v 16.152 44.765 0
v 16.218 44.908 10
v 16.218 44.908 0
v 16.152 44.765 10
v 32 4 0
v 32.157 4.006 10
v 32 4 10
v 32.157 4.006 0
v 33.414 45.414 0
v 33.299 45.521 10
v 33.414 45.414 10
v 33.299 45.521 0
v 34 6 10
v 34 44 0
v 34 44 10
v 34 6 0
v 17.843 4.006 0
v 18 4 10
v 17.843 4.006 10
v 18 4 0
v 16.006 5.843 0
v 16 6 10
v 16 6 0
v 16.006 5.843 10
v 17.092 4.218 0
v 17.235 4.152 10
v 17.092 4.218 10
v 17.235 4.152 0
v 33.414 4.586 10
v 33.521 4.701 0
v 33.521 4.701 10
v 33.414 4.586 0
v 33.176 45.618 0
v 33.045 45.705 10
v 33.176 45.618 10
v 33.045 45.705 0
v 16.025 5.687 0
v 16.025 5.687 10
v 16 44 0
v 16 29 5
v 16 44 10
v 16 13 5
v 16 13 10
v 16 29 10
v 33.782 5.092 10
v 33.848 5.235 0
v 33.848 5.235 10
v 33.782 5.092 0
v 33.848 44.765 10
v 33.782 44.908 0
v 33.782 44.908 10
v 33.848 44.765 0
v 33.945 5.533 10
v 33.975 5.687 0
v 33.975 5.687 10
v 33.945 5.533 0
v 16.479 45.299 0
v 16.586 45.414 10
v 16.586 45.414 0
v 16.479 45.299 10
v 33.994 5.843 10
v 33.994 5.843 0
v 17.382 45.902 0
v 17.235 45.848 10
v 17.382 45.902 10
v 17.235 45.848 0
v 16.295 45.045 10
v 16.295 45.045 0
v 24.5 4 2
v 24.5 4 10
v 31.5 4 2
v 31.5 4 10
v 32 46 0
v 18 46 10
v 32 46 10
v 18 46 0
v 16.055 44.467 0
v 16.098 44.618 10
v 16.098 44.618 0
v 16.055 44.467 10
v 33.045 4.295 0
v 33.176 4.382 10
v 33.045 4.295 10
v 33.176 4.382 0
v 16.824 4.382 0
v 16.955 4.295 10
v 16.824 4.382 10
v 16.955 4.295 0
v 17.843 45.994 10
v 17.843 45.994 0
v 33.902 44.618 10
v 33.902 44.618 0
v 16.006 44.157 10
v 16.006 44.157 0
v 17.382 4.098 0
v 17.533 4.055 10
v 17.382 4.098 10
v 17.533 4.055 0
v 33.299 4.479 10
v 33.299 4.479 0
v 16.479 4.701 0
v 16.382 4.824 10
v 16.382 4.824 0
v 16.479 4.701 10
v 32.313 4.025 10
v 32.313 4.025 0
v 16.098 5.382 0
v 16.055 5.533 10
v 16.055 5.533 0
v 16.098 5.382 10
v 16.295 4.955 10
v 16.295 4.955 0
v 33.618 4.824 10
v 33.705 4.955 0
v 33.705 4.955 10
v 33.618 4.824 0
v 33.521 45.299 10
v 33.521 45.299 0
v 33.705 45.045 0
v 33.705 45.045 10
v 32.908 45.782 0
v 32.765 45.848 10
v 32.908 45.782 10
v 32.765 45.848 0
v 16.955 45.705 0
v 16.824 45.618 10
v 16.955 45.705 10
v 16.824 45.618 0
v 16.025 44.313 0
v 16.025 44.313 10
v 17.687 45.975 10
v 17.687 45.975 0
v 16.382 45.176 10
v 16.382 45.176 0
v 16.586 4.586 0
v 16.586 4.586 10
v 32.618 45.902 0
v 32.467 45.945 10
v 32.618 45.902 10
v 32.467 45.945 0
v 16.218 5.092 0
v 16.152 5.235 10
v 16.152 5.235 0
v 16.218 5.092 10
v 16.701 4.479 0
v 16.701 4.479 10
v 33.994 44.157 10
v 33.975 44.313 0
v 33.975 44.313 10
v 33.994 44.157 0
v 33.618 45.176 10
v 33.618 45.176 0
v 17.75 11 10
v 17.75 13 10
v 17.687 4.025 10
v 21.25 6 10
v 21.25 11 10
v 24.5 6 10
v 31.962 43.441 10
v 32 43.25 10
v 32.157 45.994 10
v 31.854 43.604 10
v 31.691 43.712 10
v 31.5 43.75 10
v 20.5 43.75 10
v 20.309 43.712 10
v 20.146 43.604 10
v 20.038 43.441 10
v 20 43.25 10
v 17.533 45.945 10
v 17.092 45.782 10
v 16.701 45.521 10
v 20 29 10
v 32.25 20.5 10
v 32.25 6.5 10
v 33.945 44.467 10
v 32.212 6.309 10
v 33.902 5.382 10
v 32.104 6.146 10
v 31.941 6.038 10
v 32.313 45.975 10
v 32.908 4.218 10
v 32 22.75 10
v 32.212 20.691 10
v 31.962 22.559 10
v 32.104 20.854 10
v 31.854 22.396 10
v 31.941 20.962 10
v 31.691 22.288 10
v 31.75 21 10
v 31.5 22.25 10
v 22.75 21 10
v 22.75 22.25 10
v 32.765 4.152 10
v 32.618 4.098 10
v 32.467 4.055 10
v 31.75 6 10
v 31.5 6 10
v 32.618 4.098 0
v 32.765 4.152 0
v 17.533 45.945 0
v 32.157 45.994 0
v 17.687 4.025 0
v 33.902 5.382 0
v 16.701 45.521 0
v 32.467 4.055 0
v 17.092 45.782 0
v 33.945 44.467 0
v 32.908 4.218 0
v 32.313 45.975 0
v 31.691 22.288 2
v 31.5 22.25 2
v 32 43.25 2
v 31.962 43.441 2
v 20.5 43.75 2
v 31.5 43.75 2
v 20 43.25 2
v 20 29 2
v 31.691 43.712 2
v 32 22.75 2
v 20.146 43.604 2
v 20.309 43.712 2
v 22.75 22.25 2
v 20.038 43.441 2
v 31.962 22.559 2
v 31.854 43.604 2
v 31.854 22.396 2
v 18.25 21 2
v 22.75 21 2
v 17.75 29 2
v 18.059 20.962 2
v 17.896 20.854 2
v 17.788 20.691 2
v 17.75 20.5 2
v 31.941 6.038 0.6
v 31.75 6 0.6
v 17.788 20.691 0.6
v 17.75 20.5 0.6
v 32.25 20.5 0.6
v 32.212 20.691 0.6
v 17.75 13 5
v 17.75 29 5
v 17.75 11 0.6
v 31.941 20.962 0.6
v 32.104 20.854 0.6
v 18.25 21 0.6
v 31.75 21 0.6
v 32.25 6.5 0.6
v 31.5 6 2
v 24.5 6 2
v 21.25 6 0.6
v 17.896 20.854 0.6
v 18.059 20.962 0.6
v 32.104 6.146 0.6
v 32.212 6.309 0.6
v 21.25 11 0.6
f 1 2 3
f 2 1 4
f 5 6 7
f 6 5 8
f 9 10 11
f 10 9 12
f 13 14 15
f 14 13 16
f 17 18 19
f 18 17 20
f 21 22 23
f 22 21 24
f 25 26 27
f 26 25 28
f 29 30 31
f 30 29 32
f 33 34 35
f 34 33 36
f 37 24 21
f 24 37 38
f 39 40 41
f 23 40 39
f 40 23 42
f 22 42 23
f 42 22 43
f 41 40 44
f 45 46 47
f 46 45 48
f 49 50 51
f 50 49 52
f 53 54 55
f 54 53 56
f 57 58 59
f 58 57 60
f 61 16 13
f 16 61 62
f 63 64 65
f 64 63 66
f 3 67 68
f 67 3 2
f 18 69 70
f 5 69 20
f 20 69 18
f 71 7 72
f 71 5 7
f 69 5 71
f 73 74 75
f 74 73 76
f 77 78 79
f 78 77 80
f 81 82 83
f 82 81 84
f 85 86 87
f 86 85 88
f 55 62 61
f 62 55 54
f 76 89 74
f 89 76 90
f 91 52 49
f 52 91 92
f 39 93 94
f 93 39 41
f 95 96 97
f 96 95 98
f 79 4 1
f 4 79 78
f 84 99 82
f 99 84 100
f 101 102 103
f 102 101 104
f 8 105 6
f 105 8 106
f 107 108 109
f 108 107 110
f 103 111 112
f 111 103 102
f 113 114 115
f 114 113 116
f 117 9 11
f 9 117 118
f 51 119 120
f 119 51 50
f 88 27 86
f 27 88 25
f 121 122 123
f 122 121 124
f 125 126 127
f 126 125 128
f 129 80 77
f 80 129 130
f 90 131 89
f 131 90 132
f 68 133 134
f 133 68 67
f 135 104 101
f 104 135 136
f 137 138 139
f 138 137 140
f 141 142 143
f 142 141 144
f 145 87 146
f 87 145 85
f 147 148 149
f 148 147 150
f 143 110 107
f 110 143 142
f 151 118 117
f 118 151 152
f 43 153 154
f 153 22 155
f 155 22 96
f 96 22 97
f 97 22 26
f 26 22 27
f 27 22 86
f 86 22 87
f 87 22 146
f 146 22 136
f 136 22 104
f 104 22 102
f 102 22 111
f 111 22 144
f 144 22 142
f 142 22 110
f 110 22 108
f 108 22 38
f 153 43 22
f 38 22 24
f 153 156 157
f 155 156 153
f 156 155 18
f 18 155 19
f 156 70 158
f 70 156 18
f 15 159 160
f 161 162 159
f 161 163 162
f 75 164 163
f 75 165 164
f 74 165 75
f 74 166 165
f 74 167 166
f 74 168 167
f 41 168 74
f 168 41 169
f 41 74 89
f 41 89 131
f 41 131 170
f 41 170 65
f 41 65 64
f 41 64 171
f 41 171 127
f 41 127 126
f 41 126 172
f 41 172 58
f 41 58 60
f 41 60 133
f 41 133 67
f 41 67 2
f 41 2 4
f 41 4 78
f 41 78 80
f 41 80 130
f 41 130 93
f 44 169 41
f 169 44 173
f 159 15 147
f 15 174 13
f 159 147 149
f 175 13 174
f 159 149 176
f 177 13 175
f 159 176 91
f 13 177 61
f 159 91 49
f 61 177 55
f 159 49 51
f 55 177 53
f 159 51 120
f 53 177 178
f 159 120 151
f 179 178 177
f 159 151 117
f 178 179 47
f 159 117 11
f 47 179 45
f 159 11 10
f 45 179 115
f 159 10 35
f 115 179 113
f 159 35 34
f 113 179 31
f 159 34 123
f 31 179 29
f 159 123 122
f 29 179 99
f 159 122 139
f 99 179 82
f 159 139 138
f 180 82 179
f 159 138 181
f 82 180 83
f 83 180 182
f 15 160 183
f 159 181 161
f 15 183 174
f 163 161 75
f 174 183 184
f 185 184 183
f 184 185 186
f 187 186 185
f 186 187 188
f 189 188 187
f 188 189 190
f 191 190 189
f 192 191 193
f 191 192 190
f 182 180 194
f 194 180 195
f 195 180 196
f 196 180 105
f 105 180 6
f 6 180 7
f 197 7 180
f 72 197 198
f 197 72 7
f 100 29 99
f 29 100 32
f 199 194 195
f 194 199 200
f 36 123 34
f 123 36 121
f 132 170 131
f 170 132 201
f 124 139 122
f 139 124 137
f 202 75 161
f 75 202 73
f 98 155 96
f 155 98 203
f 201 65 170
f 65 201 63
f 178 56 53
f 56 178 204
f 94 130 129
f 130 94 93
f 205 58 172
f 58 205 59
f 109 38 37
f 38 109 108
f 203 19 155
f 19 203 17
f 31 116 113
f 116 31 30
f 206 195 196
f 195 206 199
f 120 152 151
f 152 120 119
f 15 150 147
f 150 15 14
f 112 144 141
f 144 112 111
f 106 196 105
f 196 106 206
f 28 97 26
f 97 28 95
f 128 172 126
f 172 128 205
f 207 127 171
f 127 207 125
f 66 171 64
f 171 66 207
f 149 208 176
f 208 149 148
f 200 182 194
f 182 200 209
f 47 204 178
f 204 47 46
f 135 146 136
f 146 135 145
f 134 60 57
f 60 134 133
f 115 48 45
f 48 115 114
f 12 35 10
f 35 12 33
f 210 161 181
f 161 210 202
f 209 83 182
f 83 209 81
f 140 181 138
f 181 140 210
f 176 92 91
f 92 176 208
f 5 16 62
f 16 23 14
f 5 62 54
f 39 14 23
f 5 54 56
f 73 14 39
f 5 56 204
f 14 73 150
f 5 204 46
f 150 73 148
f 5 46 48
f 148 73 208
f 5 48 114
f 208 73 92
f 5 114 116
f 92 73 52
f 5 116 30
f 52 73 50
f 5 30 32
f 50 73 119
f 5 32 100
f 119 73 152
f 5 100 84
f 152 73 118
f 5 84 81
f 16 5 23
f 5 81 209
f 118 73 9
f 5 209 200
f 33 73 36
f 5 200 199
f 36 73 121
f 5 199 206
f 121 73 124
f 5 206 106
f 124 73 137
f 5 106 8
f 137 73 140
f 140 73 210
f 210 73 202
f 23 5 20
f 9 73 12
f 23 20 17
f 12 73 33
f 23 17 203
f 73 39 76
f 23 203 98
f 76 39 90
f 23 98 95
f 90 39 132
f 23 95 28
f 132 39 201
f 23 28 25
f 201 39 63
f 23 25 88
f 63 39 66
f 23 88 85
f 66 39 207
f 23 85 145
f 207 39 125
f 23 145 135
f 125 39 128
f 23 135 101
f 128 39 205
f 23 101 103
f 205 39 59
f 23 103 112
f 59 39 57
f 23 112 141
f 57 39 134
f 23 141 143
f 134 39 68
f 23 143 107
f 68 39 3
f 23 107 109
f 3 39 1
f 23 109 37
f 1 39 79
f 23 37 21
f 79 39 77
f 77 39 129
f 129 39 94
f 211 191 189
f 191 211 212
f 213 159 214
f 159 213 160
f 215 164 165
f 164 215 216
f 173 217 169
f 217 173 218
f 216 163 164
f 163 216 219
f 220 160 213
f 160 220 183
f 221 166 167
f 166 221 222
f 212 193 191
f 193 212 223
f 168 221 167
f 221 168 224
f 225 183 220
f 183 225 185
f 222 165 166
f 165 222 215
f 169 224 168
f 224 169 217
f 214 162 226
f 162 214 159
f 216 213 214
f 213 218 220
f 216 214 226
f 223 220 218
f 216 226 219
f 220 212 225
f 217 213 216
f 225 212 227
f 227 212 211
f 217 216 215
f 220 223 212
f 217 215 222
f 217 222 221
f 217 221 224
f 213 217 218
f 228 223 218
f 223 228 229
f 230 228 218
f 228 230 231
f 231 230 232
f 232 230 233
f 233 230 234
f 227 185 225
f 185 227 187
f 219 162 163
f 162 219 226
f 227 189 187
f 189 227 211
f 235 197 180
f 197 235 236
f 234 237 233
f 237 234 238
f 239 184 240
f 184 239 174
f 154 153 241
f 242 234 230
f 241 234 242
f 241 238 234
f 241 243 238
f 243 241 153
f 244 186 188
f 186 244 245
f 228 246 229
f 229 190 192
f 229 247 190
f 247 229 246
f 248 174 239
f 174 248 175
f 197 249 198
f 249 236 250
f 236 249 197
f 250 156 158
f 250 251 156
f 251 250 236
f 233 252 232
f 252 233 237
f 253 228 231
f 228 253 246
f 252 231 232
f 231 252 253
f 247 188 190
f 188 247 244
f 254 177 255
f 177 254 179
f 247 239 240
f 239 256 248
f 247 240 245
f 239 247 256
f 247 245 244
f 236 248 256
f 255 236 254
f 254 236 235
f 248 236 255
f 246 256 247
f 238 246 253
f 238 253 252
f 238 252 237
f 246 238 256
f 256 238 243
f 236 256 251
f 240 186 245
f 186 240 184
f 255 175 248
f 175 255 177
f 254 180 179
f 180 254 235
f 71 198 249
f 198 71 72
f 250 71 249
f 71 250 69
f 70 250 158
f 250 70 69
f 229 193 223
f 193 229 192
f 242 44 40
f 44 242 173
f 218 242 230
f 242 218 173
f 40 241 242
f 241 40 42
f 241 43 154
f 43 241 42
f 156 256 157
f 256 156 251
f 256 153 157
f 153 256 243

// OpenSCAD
// file: powerlid.scad
// powerlid

//---------------
module powerlid(){
tol=0.2;
translate([25,25,0]){
difference(){
    color("yellow")
    linear_extrude(height=11)
    offset(r=2,$fn=80)    
    square(size=[18,42],center=true);

    translate([0,0,-0.01])
    color("orange")
    linear_extrude(height=9.4+0.6)
    offset(r=2,$fn=80)    
    square(size=[14+tol*2,38+tol*2],center=true);


    translate([-13.5,-24,-1])
    color("red")
    cube([6,48,11]);

    // plug at bottom
    translate([-3,-25,-1])
    color("blue")
    cube([14,4,13]);

    // vent holes
    translate([2.5,16,-1])
    color("red")
    cylinder(r=3,h=20,$fn=22);
    translate([2.5,7,-1])
    color("pink")
    cylinder(r=3,h=20,$fn=22);

}

}
}
//---------------

powerlid();
// file: pibase.scad
// pibase.scad
// This is the back for the pi zero



module pibase(){
    
// base borrowed from pieye
difference(){
    color("yellow")
    linear_extrude(height=5)
    offset(r=2,$fn=80)    
    square(size=[30,65],center=true);

    translate([0,0,1.5])
    color("orange")
    linear_extrude(height=5)
    offset(r=0.5,$fn=16)    
    square(size=[30,65],center=true);

    translate([-8.5,-36,1.5])
    color("red")
    cube([17,5,5]);

    translate([-8.5,30,1.5])
    color("red")
    cube([17,5,5]);

    translate([-14,30,12])
    color("green")
    cube([28,5,5]);

    translate([0,0,-1])
    cylinder(r=9,h=5,$fn=6);
    translate([0,20,-1])
    cylinder(r=9,h=5,$fn=6);
    translate([0,-20,-1])
    cylinder(r=9,h=5,$fn=6);


}

// posts to support PCB
color("pink")
translate([-15+3.2,-32.0+3,1]){
    cylinder(r=2.5,h=3,$fn=16);
    cylinder(r=1,h=4,$fn=16);
}
color("pink")
translate([15-3.2,-32.0+3,1]){
    cylinder(r=2.5,h=3,$fn=16);
    cylinder(r=1,h=4,$fn=16);
}
translate([-14.75+3.2,32.25-3,1]){
    cylinder(r=2.5,h=3,$fn=16);
    cylinder(r=1,h=4,$fn=16);
}
translate([14.75-3.2,32.25-3,1]){
    cylinder(r=2.5,h=3,$fn=16);
    cylinder(r=1,h=4,$fn=16);
}

} // end module pibase

pibase();
// main file
// powerbase
// base plate for the dcdc supply and power plug

use <pibase.scad>
use <powerlid.scad>

module powerbase(){
// base borrowed from pieye
translate([25,25,0]){
difference(){
    color("yellow")
    linear_extrude(height=9.4+0.6)
    offset(r=2,$fn=80)    
    square(size=[14,38],center=true);

    translate([1,8,2])
    color("orange")
    linear_extrude(height=10)
    offset(r=0.5,$fn=16)    
    square(size=[11,20.5],center=true);

    translate([0,-11.5,0.6])
    color("pink")
    linear_extrude(height=10)
    offset(r=0.5,$fn=16)    
    square(size=[13.5,14],center=true);

    translate([-0.5,-22,2])
    color("green")
    cube([7,5,10]);

    translate([-7.25,-6,2])
    color("blue")
    cube([5,10,10]);

    translate([-10,-12,5])
    color("orange")
    cube([6,16,10]);
}

/*
    translate([1,12.25,0])
    color("red")
    linear_extrude(height=3.4)
    offset(r=0.5,$fn=16)    
    square(size=[12,15.5],center=true);
*/
    translate([-7.25,-19,0])
    color("blue")
    cube([3.5,5,10]);

}
}

//------------
powerbase();

/*
translate([0,0,0])
powerlid();
*/

//pibase();


//---------- end of file ------------------
